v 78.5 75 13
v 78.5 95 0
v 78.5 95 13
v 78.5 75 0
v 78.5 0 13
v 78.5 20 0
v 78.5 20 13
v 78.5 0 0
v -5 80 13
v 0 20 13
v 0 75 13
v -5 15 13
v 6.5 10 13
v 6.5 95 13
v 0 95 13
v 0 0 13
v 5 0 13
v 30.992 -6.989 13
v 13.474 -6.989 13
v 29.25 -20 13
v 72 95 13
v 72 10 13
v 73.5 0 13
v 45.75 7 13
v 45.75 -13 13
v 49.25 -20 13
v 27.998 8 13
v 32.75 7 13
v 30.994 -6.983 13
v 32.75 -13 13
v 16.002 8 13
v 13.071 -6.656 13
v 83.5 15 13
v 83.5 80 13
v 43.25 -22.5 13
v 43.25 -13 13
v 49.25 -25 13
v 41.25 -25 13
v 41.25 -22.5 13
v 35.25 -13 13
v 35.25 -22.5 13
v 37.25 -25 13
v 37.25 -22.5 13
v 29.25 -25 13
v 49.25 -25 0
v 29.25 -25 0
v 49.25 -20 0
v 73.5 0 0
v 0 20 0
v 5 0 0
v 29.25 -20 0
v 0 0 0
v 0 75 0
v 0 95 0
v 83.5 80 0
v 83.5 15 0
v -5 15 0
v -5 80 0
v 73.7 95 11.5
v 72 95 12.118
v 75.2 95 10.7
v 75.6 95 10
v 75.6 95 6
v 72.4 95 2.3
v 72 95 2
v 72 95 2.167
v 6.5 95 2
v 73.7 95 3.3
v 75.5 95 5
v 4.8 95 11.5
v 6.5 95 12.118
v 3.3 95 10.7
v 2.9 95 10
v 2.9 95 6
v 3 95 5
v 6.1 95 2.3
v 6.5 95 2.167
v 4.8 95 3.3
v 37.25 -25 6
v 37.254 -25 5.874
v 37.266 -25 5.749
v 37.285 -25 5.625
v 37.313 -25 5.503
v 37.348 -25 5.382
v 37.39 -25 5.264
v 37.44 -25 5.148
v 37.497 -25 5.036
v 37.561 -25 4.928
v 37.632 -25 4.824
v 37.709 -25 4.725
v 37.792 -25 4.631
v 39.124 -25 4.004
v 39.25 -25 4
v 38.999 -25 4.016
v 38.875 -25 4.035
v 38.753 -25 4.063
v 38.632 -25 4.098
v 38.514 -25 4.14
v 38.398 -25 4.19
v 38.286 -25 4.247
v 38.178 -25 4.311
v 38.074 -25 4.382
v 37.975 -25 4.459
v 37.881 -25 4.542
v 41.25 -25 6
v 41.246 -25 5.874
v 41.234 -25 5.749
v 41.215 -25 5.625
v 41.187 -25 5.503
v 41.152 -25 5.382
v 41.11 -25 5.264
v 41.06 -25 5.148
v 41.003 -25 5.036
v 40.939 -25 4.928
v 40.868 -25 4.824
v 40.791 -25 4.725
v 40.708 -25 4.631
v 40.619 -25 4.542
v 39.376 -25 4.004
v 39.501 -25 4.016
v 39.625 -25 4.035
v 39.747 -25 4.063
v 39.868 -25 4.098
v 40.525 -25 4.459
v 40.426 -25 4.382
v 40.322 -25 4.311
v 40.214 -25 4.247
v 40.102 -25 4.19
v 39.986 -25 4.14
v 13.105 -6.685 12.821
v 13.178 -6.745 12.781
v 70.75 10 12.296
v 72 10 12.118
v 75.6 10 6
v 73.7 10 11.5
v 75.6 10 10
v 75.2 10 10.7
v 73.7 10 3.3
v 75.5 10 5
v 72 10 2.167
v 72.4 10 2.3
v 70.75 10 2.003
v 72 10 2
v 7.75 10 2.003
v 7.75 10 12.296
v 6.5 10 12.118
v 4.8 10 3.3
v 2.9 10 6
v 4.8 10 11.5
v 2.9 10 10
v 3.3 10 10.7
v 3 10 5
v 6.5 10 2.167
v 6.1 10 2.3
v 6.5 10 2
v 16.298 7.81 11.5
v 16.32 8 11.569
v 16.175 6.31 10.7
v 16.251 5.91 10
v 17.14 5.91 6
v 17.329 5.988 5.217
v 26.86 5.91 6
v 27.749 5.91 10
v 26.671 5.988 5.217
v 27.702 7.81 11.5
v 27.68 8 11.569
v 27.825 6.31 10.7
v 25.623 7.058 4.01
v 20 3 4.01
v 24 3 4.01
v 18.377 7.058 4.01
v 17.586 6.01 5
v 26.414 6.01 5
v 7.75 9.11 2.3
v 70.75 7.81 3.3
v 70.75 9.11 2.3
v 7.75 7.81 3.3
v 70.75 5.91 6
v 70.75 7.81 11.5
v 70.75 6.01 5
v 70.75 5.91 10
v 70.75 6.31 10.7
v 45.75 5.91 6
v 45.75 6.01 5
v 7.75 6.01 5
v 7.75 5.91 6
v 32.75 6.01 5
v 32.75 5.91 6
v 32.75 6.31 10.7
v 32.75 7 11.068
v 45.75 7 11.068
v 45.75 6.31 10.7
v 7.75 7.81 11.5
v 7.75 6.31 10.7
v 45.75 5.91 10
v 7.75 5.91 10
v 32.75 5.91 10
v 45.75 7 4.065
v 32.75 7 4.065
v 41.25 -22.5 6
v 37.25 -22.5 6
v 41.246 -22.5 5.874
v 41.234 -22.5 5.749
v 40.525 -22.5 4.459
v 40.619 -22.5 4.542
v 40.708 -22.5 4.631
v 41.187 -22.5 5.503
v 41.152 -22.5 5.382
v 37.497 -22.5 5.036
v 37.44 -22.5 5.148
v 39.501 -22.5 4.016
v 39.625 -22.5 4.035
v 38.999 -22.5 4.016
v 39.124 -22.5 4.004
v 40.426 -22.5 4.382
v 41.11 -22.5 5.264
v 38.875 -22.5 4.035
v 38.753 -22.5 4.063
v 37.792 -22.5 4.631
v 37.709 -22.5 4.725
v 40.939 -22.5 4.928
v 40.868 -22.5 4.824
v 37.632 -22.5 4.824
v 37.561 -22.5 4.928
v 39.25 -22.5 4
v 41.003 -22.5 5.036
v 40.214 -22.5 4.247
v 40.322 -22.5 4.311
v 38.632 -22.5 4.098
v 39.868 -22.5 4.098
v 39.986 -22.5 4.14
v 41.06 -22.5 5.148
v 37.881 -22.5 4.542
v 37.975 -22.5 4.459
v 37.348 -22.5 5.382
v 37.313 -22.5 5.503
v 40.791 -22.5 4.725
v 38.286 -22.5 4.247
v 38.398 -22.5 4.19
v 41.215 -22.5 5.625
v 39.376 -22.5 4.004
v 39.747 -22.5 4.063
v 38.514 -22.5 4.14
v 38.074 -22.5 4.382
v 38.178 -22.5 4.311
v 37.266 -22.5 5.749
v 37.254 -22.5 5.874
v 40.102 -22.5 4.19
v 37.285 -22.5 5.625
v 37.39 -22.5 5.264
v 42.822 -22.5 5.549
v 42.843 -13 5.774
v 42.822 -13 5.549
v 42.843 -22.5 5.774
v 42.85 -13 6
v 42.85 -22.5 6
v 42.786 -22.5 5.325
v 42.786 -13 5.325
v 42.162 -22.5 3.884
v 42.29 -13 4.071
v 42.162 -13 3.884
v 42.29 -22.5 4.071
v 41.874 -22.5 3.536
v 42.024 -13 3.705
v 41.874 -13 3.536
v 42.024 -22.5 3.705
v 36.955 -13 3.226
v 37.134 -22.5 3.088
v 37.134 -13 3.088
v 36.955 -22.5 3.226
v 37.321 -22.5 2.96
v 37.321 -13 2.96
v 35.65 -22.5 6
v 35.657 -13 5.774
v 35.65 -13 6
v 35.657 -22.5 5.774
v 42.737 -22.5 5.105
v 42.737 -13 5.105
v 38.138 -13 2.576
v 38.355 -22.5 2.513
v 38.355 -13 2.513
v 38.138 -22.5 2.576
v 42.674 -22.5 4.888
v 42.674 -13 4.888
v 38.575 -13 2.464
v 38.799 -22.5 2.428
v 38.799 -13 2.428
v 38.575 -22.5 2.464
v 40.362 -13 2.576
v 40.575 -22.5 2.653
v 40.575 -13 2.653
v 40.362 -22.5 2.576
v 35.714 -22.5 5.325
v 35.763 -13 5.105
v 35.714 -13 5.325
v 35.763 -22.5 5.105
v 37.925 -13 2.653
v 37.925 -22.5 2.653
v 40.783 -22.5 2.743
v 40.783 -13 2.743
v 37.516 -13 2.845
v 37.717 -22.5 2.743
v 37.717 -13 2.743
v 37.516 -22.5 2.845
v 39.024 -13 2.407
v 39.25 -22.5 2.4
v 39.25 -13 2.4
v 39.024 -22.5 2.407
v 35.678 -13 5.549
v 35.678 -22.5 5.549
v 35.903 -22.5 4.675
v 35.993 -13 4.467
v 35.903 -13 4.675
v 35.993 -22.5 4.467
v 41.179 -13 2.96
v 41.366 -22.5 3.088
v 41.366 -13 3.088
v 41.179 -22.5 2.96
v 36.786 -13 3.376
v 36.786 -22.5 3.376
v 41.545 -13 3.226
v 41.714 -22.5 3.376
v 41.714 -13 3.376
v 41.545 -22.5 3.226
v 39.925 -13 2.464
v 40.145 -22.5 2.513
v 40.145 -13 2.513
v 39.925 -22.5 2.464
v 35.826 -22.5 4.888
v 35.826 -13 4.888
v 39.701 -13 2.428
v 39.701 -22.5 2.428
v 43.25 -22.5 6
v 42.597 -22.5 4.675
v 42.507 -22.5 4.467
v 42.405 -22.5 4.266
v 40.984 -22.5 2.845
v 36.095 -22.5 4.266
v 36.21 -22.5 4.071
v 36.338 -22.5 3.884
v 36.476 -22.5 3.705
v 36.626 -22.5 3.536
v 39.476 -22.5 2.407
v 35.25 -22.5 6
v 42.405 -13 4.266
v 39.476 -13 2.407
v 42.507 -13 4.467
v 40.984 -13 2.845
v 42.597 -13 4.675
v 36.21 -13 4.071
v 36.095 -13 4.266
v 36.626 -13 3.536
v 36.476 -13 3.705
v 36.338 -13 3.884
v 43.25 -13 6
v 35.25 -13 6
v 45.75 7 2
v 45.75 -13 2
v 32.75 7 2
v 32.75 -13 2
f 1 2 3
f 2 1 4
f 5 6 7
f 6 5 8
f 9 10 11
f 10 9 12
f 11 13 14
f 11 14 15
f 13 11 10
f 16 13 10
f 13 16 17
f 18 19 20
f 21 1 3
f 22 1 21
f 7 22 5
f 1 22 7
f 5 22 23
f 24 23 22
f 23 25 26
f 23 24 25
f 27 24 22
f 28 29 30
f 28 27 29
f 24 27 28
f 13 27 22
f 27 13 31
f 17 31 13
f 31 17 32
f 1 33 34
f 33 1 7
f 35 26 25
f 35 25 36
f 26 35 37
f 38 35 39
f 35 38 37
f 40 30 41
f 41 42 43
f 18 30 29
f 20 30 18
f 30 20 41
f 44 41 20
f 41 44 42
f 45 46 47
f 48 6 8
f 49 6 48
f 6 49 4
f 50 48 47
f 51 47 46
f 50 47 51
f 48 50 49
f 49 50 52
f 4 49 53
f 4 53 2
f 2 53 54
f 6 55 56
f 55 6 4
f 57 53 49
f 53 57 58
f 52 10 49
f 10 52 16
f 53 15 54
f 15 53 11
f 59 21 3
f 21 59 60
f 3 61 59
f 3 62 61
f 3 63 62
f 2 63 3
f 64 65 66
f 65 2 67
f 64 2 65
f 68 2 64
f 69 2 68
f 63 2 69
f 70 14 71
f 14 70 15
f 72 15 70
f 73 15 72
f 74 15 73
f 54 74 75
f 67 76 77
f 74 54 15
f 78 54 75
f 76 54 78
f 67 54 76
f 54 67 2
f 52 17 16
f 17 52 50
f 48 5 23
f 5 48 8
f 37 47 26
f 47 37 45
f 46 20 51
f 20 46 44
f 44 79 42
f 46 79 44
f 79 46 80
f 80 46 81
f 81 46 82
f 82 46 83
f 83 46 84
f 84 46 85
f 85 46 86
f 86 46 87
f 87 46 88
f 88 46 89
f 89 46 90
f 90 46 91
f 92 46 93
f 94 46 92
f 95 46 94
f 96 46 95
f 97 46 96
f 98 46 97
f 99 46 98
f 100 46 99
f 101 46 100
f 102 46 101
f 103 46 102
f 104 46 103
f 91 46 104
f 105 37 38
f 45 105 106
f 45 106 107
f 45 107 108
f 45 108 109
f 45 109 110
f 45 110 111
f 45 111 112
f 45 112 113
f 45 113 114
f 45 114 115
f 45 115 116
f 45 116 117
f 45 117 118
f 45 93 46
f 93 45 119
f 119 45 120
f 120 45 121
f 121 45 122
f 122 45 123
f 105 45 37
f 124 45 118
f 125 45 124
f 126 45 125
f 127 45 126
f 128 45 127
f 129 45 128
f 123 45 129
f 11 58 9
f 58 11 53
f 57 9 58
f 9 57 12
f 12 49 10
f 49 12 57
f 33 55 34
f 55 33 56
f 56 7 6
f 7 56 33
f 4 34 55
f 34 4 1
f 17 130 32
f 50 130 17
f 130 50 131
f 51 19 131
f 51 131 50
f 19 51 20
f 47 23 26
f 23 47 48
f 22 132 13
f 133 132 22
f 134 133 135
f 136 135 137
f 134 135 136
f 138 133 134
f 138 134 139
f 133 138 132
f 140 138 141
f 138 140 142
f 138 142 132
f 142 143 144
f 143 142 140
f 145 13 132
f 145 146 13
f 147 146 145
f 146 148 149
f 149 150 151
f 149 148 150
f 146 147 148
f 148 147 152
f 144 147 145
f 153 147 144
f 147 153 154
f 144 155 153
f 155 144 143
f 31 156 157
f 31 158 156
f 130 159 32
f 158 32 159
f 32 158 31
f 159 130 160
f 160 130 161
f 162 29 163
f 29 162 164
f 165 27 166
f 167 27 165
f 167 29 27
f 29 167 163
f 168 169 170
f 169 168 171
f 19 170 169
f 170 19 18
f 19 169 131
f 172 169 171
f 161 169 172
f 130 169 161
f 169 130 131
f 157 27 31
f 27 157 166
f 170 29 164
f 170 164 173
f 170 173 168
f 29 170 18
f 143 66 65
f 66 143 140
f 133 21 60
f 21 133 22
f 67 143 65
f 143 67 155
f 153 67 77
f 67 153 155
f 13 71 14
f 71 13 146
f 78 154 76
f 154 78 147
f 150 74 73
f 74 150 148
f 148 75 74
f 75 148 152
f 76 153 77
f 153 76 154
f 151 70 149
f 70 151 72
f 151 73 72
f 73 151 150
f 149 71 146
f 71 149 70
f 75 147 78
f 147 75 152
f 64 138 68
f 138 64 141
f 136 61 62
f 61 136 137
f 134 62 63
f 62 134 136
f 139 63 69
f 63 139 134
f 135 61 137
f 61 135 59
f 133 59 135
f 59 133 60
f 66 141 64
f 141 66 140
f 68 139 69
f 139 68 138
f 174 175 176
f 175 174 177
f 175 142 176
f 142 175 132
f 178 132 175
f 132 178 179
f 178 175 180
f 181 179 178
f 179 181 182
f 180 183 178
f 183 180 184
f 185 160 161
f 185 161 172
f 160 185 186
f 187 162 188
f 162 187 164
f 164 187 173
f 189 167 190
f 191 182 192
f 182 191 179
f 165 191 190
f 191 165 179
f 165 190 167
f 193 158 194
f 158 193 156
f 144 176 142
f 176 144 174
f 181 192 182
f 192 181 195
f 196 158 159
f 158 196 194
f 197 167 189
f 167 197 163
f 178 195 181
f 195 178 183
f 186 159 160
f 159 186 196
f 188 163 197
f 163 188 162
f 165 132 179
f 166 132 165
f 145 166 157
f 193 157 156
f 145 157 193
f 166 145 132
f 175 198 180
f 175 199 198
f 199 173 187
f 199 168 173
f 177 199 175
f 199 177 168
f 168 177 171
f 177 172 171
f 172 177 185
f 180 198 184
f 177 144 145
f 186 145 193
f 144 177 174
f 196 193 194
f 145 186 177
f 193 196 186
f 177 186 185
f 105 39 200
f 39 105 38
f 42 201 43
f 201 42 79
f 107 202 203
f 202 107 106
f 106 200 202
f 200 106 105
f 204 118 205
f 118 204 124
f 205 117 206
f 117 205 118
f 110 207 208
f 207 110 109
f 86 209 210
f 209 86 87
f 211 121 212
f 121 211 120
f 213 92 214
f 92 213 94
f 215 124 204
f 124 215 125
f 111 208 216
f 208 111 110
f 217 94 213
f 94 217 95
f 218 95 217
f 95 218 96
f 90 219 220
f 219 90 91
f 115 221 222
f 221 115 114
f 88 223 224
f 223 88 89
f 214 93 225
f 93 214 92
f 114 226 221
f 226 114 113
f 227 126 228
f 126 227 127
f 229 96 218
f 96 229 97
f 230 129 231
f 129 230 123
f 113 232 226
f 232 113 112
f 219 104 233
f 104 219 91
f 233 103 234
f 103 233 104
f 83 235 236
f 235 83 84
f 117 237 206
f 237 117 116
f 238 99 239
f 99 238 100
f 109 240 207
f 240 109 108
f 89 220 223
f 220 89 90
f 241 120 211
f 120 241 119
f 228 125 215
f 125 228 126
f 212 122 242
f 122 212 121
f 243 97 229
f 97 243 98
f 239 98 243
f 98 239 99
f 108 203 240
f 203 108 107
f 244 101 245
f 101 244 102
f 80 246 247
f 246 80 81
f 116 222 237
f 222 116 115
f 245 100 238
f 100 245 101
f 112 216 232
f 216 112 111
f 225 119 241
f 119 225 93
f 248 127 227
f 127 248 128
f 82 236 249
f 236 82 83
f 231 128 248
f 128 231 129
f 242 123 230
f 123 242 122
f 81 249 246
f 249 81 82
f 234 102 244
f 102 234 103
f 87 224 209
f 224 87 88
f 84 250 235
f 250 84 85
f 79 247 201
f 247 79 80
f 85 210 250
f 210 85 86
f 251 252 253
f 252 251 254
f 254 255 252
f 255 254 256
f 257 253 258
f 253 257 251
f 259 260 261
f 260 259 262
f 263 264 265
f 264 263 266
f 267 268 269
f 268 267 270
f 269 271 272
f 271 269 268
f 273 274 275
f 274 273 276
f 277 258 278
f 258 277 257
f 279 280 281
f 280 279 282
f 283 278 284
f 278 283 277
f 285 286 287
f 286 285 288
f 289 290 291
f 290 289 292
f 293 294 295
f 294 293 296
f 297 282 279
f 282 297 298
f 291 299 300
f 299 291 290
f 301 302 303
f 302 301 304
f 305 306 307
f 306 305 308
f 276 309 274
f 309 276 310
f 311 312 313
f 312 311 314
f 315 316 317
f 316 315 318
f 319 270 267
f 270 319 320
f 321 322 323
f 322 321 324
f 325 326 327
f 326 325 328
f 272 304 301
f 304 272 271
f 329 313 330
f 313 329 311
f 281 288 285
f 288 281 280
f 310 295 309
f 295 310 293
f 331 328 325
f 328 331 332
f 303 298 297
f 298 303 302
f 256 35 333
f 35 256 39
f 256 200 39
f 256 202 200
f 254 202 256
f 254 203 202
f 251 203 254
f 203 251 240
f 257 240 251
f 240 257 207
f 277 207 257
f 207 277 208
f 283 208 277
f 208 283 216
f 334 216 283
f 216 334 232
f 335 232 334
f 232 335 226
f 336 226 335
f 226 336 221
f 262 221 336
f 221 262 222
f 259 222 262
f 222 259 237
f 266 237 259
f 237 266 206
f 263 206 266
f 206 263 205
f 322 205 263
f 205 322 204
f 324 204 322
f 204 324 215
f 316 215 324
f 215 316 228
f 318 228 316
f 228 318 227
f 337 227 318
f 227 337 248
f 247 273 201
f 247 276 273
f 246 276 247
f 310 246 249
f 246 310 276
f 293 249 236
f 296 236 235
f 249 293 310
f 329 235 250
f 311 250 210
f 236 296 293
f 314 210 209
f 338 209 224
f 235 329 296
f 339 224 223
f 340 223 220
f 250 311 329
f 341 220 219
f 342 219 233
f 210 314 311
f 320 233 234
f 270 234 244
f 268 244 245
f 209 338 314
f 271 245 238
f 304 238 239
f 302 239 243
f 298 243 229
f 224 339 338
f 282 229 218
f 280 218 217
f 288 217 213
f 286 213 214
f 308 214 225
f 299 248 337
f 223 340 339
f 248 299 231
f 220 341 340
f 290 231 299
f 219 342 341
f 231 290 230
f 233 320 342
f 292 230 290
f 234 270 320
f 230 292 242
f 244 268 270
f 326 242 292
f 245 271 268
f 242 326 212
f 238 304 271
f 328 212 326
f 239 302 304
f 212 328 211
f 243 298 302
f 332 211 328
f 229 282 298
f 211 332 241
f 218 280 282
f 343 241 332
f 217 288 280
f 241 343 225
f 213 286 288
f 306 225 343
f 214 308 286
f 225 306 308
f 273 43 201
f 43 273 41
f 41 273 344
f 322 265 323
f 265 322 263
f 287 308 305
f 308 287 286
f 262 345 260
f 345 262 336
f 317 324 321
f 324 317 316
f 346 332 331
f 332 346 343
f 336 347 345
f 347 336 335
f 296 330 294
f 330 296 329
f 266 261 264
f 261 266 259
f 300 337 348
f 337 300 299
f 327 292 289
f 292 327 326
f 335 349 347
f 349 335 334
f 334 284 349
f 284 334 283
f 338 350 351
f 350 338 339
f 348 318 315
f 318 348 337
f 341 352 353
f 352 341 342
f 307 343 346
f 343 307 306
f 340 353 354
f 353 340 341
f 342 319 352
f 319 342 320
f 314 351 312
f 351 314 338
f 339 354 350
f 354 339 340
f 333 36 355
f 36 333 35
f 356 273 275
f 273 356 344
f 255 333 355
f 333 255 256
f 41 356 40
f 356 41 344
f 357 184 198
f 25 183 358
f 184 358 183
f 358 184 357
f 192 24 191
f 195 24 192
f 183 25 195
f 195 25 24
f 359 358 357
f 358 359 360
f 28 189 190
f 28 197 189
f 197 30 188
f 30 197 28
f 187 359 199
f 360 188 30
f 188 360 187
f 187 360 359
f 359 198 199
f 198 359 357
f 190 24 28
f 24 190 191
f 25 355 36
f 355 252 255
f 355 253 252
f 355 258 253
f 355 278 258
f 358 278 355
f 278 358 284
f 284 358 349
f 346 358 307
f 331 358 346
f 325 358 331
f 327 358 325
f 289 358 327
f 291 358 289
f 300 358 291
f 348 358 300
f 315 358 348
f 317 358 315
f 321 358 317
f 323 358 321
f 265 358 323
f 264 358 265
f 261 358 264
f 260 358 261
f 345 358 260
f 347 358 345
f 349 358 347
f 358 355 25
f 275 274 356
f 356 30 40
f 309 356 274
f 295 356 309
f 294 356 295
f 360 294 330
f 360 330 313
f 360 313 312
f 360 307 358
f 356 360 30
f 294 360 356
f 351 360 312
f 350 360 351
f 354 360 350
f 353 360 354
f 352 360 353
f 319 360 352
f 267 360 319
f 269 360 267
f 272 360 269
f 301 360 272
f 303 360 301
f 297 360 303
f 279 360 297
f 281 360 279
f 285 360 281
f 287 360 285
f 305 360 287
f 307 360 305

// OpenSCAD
$fn=100;
w=74.5;
W=78.5;
L=95;
r = 4;
d=8;
D=13;
a=18;
b=8;
z = 4.01;
profil = [[0,0],[-0.9,0.3],[-2.2,1.3],[-4.0,3.0],[-4.1,4],[-4.1,8.0],[-3.7,8.7],[-2.2,9.5],[0.0,10.3]];
difference() {
    union() {
        cube([W,L,D],[0,0,0]);
        translate([W/2-10,-25,0]) cube([20,25,D]);
        polyhedron([[0,20,0],[-5,15,0],[-5,L-15,0],[0,L-20,0],
                     [0,20,D],[-5,15,D],[-5,L-15,D],[0,L-20,D]],
                    [[0,3,2,1],[4,5,6,7],
                     [4,0,1,5],[5,1,2,6],[6,2,3,7],[7,3,0,4]]);
        polyhedron([[W,20,0],[W,L-20,0],[W+5,L-15,0],[W+5,15,0],
                     [W,20,D],[W,L-20,D],[W+5,L-15,D],[W+5,15,D]],
                    [[0,3,2,1],[4,5,6,7],
                     [4,0,1,5],[5,1,2,6],[6,2,3,7],[7,3,0,4]]);
        
        polyhedron([[5,0,0],[W/2-10,0,0],[W/2-10,-20,0],
                     [5,0,D],[W/2-10,0,D],[W/2-10,-20,D]],
                    [[0,1,2],[5,4,3],
                     [0,3,4,1],[1,4,5,2],[2,5,3,0]]);
        polyhedron([[W-5,0,0],[W/2+10,0,0],[W/2+10,-20,0],
                     [W-5,0,D],[W/2+10,0,D],[W/2+10,-20,D]],
                    [[0,2,1],[5,3,4],
                     [1,4,3,0],[1,2,5,4],[0,3,5,2]]);
        
    }
    translate([7,10,2]) rotate([0,0,180]) rotate_extrude(angle=90, convexity=1) {polygon(profil);};
    translate([W-7.5,10,2]) rotate([0,0,180]) rotate_extrude(angle=90, convexity=1) {polygon(profil);};
        polyhedron([[a,b,z],[a+8,b,z],[a+6,b-5,z],[a+2,b-5,z],
                     [a-2,b,z+9],[a+10,b,z+9],[a+13,b-15,z+9],[a-5,b-15,z+9]],
                    [[3,2,1,0],[4,5,6,7],
                     [0,1,5,4],[2,3,7,6],
                     [0,4,7],[7,3,0],[5,1,6],[2,6,1]]);
    //translate(,[1,5,1]) cube([74,91,8]);
    translate([6.5,10,2]) cube([65.5,86,D+1]);
    //translate([(W-w)/2+r,15.5,5.5])  rotate([270,0,0]) cylinder(r=r,h=81);

    translate([(W-w)/2+r+1,60,2]) rotate([90,0,0]) linear_extrude(height = 100, center = true, convexity = 10, twist = 0, slices = 20, scale = 1.0, $fn = 16) 
    {polygon(profil);};

    //translate([W-((W-w)/2+r),15.5,5.5])         rotate([270,0,0]) cylinder(r=r,h=81);
    translate([w-3,60,2]) rotate([90,0,180]) linear_extrude(height = 100, center = true, convexity = 10, twist = 0, slices = 20, scale = 1.0, $fn = 16) 
    {polygon(profil);};

    //translate([12,9,5.5])         rotate([0,90,0]) cylinder(r=r,h=W-24);
    translate([W/2,10.01,2]) rotate([90,0,0]) rotate([90,90,90]) linear_extrude(height = 63, center = true, convexity = 10, twist = 0, slices = 20, scale = 1.0, $fn = 16) 
    {polygon(profil);};
    //translate([13,16,5.5]) rotate([0,0,180]) rotate_extrude(angle=90, convexity=1) translate([7, 0]) circle(r=r);
    //translate([W-13,16,5.5]) rotate([0,0,270]) rotate_extrude(angle=90, convexity=1) translate([7, 0]) circle(r=r);
    translate([W/2-2,-26,6]) cube([4,31,8]);
    translate([W/2,-26,6]) rotate([-90,0,0]) cylinder(r=2,h=31);
    translate([W/2,-22.5,6]) rotate([-90,0,0]) cylinder(r=3.6,h=10);
    translate([W/2-4,-22.5,6]) cube([8,10,8]);
    translate([W/2-6.5,-13,2]) cube([13,20,12]);
}
//translate([0,60,0])
//   rotate_extrude(angle=270, convexity=10)
//       translate([40, 0]) circle(10);
//rotate_extrude(angle=90, convexity=10)
//   translate([20, 0]) circle(10);

//translate([20,0,0]) 
//   rotate([90,0,0]) cylinder(r=10,h=80);
